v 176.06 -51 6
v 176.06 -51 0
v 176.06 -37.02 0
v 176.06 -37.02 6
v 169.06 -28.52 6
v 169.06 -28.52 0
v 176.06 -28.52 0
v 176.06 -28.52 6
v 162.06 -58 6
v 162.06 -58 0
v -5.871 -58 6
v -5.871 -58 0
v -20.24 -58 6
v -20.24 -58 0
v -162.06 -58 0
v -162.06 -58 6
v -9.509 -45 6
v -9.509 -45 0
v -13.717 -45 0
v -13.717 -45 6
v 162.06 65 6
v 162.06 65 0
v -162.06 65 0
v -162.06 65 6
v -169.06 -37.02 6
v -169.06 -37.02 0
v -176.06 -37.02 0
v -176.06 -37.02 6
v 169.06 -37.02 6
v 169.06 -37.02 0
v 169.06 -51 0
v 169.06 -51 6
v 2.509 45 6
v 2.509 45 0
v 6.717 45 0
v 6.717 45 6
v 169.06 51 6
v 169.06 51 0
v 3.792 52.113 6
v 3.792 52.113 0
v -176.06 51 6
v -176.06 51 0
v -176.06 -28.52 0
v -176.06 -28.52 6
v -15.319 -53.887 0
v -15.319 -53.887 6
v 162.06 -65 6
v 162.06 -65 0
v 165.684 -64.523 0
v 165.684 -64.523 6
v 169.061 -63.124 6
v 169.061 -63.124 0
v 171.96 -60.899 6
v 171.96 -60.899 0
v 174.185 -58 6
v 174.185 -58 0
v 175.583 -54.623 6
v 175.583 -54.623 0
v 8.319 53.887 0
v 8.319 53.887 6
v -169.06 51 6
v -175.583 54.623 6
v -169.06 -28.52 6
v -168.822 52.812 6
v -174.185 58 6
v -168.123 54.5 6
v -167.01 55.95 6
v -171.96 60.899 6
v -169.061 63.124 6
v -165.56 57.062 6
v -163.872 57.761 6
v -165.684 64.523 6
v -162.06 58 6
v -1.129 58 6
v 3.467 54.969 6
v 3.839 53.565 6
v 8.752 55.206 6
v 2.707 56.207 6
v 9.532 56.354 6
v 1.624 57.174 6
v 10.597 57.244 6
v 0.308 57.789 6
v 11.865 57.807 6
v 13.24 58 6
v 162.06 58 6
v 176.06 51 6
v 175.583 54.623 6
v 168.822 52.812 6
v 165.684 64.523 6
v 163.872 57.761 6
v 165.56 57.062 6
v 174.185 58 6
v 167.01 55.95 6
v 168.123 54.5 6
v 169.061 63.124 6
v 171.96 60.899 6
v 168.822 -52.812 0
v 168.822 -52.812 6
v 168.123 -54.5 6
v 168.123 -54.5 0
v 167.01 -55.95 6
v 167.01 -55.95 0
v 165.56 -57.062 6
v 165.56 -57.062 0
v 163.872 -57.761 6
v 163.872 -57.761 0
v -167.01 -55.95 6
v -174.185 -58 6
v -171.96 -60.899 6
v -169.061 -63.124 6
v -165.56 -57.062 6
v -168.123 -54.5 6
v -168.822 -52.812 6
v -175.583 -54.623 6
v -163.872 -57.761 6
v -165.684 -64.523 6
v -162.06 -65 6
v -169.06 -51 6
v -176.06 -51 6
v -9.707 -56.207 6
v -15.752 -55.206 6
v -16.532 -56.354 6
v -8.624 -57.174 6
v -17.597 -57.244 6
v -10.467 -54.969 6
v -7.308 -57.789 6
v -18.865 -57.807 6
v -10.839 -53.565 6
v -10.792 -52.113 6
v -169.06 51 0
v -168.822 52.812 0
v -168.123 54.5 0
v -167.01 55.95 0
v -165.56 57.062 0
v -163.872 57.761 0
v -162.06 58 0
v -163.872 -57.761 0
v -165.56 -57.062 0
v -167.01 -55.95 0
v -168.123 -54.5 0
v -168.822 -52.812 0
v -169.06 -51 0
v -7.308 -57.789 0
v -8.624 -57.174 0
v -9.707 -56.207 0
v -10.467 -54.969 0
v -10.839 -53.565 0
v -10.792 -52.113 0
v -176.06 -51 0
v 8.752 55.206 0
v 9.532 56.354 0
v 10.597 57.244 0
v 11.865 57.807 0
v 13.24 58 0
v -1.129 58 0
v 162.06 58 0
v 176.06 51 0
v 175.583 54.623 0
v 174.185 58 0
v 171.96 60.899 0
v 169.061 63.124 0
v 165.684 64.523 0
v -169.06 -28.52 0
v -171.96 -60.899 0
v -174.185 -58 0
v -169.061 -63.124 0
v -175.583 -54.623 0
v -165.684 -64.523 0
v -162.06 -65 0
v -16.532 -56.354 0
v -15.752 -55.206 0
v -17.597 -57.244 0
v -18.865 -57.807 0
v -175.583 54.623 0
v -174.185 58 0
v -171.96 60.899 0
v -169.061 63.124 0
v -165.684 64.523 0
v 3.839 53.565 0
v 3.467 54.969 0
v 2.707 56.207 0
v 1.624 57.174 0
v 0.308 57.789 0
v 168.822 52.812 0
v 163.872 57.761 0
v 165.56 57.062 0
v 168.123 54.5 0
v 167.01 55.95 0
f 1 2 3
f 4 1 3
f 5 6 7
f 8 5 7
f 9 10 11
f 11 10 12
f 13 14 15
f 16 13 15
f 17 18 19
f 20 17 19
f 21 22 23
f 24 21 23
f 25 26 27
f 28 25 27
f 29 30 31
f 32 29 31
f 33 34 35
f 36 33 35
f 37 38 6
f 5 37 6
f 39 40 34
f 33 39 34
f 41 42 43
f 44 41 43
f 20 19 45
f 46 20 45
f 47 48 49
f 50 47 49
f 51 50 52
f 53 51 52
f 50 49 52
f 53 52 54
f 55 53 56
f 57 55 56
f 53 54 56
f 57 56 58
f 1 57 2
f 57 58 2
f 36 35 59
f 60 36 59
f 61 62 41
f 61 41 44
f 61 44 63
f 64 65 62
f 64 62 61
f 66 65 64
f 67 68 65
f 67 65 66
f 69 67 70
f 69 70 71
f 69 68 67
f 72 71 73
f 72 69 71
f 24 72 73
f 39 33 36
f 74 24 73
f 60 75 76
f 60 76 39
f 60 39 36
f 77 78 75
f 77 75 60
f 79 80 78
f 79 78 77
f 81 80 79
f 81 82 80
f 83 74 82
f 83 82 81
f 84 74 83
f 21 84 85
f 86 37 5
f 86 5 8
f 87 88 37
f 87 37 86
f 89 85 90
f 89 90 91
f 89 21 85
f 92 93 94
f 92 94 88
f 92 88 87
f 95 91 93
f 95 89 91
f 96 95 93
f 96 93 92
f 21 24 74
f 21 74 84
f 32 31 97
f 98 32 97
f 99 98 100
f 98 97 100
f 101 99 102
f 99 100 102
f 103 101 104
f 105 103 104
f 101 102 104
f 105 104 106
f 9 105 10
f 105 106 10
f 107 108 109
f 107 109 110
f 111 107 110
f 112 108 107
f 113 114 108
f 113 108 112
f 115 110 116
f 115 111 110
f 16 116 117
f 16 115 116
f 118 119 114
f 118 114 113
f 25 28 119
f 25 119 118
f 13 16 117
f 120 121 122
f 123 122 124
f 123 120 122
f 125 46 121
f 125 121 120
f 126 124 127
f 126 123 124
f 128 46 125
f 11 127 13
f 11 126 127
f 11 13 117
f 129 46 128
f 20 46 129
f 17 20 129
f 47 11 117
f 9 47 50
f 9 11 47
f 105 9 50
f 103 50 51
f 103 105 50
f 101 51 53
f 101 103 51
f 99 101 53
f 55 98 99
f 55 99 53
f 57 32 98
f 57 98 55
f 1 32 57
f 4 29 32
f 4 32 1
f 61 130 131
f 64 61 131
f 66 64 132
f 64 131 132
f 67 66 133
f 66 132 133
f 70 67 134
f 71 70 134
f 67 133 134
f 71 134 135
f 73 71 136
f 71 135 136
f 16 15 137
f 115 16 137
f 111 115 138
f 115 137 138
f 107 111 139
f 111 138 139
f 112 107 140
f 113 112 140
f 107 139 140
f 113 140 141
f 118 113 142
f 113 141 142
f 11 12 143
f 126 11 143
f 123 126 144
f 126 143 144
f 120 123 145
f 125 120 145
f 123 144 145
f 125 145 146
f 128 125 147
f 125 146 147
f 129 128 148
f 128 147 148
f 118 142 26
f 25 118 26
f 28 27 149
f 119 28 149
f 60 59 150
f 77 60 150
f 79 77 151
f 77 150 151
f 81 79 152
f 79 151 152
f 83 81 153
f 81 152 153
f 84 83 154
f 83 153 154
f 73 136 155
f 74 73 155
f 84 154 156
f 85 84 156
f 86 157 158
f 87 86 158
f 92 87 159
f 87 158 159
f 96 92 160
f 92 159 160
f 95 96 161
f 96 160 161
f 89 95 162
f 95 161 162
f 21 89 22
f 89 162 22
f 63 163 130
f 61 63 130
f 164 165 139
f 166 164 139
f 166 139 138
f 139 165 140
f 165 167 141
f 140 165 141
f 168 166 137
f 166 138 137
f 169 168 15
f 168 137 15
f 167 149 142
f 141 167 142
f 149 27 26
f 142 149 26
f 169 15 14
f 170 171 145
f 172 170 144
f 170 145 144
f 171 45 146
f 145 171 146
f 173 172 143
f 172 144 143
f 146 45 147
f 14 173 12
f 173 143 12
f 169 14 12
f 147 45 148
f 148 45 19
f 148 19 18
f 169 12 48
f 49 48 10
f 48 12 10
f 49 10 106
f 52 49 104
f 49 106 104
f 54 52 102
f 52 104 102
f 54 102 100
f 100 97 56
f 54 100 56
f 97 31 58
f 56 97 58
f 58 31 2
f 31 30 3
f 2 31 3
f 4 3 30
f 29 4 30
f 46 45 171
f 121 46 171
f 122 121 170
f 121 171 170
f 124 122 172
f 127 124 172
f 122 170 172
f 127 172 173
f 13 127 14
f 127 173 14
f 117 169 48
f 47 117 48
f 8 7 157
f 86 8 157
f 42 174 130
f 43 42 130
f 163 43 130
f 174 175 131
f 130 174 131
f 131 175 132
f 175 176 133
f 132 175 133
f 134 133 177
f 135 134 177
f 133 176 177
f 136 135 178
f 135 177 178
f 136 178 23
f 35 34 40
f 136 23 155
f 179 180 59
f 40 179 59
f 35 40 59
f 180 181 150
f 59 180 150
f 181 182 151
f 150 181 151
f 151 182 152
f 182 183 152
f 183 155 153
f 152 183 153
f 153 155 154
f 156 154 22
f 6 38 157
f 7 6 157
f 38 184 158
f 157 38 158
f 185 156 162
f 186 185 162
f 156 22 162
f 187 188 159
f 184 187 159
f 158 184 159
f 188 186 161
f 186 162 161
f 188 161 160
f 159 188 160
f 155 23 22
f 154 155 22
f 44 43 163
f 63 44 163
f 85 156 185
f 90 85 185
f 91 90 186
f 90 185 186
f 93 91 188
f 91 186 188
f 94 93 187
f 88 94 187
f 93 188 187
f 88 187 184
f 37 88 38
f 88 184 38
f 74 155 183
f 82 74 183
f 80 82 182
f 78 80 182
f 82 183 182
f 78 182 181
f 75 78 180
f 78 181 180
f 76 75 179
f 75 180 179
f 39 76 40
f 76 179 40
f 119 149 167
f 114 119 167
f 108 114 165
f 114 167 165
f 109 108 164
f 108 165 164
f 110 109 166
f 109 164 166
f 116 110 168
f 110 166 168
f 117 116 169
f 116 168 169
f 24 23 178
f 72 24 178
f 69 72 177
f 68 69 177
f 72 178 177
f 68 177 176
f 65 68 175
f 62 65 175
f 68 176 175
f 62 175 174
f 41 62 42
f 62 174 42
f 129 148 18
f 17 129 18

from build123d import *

# Parameters (mm, degrees)
SALIENTE_EXTRUIR3_DEPTH   = 6
SALIENTE_EXTRUIR3_2_DEPTH = 6


with BuildPart() as part:
    # Croquis1 → Saliente-Extruir3 (new body)
    with BuildSketch(Plane.XY):
        with BuildLine():
            Line((-162.0605, 58), (-1.12905479, 58))
            ThreePointArc((-1.12905479, 58), (2.707330681, 56.206578631), (3.791613878, 52.112858607))
            Line((3.791613878, 52.112858607), (2.509245217, 45))
            Line((2.509245217, 45), (6.716745749, 45))
            Line((6.716745749, 45), (8.318997704, 53.887141393))
            ThreePointArc((8.318997704, 53.887141393), (10.033087742, 56.836385471), (13.239666373, 58))
            Line((13.239666373, 58), (162.0605, 58))
            ThreePointArc((162.0605, 58), (167.010247468, 55.949747468), (169.0605, 51))
            Line((169.0605, 51), (169.0605, -28.52))
            Line((169.0605, -28.52), (176.0605, -28.52))
            Line((176.0605, -28.52), (176.0605, 51))
            ThreePointArc((176.0605, 51), (171.959994937, 60.899494937), (162.0605, 65))
            Line((162.0605, 65), (-162.0605, 65))
            ThreePointArc((-162.0605, 65), (-171.959994937, 60.899494937), (-176.0605, 51))
            Line((-176.0605, 51), (-176.0605, -28.52))
            Line((-176.0605, -28.52), (-169.0605, -28.52))
            Line((-169.0605, -28.52), (-169.0605, 51))
            ThreePointArc((-169.0605, 51), (-167.010247468, 55.949747468), (-162.0605, 58))
        make_face()
    extrude(amount=SALIENTE_EXTRUIR3_DEPTH)


with BuildPart() as body_2:
    # Croquis1 → Saliente-Extruir3 2 (new body)
    with BuildSketch(Plane.XY):
        with BuildLine():
            Line((-162.0605, -65), (162.0605, -65))
            ThreePointArc((162.0605, -65), (171.959994937, -60.899494937), (176.0605, -51))
            Line((176.0605, -51), (176.0605, -37.02))
            Line((176.0605, -37.02), (169.0605, -37.02))
            Line((169.0605, -37.02), (169.0605, -51))
            ThreePointArc((169.0605, -51), (167.010247468, -55.949747468), (162.0605, -58))
            Line((162.0605, -58), (-5.87094521, -58))
            ThreePointArc((-5.87094521, -58), (-9.707330681, -56.206578631), (-10.791613878, -52.112858607))
            Line((-10.791613878, -52.112858607), (-9.509245217, -45))
            Line((-9.509245217, -45), (-13.716745749, -45))
            Line((-13.716745749, -45), (-15.318997704, -53.887141393))
            ThreePointArc((-15.318997704, -53.887141393), (-17.033087742, -56.836385471), (-20.239666373, -58))
            Line((-20.239666373, -58), (-162.0605, -58))
            ThreePointArc((-162.0605, -58), (-167.010247468, -55.949747468), (-169.0605, -51))
            Line((-169.0605, -51), (-169.0605, -37.02))
            Line((-169.0605, -37.02), (-176.0605, -37.02))
            Line((-176.0605, -37.02), (-176.0605, -51))
            ThreePointArc((-176.0605, -51), (-171.959994937, -60.899494937), (-162.0605, -65))
        make_face()
    extrude(amount=SALIENTE_EXTRUIR3_2_DEPTH)


solid = Compound([part.part, body_2.part])
